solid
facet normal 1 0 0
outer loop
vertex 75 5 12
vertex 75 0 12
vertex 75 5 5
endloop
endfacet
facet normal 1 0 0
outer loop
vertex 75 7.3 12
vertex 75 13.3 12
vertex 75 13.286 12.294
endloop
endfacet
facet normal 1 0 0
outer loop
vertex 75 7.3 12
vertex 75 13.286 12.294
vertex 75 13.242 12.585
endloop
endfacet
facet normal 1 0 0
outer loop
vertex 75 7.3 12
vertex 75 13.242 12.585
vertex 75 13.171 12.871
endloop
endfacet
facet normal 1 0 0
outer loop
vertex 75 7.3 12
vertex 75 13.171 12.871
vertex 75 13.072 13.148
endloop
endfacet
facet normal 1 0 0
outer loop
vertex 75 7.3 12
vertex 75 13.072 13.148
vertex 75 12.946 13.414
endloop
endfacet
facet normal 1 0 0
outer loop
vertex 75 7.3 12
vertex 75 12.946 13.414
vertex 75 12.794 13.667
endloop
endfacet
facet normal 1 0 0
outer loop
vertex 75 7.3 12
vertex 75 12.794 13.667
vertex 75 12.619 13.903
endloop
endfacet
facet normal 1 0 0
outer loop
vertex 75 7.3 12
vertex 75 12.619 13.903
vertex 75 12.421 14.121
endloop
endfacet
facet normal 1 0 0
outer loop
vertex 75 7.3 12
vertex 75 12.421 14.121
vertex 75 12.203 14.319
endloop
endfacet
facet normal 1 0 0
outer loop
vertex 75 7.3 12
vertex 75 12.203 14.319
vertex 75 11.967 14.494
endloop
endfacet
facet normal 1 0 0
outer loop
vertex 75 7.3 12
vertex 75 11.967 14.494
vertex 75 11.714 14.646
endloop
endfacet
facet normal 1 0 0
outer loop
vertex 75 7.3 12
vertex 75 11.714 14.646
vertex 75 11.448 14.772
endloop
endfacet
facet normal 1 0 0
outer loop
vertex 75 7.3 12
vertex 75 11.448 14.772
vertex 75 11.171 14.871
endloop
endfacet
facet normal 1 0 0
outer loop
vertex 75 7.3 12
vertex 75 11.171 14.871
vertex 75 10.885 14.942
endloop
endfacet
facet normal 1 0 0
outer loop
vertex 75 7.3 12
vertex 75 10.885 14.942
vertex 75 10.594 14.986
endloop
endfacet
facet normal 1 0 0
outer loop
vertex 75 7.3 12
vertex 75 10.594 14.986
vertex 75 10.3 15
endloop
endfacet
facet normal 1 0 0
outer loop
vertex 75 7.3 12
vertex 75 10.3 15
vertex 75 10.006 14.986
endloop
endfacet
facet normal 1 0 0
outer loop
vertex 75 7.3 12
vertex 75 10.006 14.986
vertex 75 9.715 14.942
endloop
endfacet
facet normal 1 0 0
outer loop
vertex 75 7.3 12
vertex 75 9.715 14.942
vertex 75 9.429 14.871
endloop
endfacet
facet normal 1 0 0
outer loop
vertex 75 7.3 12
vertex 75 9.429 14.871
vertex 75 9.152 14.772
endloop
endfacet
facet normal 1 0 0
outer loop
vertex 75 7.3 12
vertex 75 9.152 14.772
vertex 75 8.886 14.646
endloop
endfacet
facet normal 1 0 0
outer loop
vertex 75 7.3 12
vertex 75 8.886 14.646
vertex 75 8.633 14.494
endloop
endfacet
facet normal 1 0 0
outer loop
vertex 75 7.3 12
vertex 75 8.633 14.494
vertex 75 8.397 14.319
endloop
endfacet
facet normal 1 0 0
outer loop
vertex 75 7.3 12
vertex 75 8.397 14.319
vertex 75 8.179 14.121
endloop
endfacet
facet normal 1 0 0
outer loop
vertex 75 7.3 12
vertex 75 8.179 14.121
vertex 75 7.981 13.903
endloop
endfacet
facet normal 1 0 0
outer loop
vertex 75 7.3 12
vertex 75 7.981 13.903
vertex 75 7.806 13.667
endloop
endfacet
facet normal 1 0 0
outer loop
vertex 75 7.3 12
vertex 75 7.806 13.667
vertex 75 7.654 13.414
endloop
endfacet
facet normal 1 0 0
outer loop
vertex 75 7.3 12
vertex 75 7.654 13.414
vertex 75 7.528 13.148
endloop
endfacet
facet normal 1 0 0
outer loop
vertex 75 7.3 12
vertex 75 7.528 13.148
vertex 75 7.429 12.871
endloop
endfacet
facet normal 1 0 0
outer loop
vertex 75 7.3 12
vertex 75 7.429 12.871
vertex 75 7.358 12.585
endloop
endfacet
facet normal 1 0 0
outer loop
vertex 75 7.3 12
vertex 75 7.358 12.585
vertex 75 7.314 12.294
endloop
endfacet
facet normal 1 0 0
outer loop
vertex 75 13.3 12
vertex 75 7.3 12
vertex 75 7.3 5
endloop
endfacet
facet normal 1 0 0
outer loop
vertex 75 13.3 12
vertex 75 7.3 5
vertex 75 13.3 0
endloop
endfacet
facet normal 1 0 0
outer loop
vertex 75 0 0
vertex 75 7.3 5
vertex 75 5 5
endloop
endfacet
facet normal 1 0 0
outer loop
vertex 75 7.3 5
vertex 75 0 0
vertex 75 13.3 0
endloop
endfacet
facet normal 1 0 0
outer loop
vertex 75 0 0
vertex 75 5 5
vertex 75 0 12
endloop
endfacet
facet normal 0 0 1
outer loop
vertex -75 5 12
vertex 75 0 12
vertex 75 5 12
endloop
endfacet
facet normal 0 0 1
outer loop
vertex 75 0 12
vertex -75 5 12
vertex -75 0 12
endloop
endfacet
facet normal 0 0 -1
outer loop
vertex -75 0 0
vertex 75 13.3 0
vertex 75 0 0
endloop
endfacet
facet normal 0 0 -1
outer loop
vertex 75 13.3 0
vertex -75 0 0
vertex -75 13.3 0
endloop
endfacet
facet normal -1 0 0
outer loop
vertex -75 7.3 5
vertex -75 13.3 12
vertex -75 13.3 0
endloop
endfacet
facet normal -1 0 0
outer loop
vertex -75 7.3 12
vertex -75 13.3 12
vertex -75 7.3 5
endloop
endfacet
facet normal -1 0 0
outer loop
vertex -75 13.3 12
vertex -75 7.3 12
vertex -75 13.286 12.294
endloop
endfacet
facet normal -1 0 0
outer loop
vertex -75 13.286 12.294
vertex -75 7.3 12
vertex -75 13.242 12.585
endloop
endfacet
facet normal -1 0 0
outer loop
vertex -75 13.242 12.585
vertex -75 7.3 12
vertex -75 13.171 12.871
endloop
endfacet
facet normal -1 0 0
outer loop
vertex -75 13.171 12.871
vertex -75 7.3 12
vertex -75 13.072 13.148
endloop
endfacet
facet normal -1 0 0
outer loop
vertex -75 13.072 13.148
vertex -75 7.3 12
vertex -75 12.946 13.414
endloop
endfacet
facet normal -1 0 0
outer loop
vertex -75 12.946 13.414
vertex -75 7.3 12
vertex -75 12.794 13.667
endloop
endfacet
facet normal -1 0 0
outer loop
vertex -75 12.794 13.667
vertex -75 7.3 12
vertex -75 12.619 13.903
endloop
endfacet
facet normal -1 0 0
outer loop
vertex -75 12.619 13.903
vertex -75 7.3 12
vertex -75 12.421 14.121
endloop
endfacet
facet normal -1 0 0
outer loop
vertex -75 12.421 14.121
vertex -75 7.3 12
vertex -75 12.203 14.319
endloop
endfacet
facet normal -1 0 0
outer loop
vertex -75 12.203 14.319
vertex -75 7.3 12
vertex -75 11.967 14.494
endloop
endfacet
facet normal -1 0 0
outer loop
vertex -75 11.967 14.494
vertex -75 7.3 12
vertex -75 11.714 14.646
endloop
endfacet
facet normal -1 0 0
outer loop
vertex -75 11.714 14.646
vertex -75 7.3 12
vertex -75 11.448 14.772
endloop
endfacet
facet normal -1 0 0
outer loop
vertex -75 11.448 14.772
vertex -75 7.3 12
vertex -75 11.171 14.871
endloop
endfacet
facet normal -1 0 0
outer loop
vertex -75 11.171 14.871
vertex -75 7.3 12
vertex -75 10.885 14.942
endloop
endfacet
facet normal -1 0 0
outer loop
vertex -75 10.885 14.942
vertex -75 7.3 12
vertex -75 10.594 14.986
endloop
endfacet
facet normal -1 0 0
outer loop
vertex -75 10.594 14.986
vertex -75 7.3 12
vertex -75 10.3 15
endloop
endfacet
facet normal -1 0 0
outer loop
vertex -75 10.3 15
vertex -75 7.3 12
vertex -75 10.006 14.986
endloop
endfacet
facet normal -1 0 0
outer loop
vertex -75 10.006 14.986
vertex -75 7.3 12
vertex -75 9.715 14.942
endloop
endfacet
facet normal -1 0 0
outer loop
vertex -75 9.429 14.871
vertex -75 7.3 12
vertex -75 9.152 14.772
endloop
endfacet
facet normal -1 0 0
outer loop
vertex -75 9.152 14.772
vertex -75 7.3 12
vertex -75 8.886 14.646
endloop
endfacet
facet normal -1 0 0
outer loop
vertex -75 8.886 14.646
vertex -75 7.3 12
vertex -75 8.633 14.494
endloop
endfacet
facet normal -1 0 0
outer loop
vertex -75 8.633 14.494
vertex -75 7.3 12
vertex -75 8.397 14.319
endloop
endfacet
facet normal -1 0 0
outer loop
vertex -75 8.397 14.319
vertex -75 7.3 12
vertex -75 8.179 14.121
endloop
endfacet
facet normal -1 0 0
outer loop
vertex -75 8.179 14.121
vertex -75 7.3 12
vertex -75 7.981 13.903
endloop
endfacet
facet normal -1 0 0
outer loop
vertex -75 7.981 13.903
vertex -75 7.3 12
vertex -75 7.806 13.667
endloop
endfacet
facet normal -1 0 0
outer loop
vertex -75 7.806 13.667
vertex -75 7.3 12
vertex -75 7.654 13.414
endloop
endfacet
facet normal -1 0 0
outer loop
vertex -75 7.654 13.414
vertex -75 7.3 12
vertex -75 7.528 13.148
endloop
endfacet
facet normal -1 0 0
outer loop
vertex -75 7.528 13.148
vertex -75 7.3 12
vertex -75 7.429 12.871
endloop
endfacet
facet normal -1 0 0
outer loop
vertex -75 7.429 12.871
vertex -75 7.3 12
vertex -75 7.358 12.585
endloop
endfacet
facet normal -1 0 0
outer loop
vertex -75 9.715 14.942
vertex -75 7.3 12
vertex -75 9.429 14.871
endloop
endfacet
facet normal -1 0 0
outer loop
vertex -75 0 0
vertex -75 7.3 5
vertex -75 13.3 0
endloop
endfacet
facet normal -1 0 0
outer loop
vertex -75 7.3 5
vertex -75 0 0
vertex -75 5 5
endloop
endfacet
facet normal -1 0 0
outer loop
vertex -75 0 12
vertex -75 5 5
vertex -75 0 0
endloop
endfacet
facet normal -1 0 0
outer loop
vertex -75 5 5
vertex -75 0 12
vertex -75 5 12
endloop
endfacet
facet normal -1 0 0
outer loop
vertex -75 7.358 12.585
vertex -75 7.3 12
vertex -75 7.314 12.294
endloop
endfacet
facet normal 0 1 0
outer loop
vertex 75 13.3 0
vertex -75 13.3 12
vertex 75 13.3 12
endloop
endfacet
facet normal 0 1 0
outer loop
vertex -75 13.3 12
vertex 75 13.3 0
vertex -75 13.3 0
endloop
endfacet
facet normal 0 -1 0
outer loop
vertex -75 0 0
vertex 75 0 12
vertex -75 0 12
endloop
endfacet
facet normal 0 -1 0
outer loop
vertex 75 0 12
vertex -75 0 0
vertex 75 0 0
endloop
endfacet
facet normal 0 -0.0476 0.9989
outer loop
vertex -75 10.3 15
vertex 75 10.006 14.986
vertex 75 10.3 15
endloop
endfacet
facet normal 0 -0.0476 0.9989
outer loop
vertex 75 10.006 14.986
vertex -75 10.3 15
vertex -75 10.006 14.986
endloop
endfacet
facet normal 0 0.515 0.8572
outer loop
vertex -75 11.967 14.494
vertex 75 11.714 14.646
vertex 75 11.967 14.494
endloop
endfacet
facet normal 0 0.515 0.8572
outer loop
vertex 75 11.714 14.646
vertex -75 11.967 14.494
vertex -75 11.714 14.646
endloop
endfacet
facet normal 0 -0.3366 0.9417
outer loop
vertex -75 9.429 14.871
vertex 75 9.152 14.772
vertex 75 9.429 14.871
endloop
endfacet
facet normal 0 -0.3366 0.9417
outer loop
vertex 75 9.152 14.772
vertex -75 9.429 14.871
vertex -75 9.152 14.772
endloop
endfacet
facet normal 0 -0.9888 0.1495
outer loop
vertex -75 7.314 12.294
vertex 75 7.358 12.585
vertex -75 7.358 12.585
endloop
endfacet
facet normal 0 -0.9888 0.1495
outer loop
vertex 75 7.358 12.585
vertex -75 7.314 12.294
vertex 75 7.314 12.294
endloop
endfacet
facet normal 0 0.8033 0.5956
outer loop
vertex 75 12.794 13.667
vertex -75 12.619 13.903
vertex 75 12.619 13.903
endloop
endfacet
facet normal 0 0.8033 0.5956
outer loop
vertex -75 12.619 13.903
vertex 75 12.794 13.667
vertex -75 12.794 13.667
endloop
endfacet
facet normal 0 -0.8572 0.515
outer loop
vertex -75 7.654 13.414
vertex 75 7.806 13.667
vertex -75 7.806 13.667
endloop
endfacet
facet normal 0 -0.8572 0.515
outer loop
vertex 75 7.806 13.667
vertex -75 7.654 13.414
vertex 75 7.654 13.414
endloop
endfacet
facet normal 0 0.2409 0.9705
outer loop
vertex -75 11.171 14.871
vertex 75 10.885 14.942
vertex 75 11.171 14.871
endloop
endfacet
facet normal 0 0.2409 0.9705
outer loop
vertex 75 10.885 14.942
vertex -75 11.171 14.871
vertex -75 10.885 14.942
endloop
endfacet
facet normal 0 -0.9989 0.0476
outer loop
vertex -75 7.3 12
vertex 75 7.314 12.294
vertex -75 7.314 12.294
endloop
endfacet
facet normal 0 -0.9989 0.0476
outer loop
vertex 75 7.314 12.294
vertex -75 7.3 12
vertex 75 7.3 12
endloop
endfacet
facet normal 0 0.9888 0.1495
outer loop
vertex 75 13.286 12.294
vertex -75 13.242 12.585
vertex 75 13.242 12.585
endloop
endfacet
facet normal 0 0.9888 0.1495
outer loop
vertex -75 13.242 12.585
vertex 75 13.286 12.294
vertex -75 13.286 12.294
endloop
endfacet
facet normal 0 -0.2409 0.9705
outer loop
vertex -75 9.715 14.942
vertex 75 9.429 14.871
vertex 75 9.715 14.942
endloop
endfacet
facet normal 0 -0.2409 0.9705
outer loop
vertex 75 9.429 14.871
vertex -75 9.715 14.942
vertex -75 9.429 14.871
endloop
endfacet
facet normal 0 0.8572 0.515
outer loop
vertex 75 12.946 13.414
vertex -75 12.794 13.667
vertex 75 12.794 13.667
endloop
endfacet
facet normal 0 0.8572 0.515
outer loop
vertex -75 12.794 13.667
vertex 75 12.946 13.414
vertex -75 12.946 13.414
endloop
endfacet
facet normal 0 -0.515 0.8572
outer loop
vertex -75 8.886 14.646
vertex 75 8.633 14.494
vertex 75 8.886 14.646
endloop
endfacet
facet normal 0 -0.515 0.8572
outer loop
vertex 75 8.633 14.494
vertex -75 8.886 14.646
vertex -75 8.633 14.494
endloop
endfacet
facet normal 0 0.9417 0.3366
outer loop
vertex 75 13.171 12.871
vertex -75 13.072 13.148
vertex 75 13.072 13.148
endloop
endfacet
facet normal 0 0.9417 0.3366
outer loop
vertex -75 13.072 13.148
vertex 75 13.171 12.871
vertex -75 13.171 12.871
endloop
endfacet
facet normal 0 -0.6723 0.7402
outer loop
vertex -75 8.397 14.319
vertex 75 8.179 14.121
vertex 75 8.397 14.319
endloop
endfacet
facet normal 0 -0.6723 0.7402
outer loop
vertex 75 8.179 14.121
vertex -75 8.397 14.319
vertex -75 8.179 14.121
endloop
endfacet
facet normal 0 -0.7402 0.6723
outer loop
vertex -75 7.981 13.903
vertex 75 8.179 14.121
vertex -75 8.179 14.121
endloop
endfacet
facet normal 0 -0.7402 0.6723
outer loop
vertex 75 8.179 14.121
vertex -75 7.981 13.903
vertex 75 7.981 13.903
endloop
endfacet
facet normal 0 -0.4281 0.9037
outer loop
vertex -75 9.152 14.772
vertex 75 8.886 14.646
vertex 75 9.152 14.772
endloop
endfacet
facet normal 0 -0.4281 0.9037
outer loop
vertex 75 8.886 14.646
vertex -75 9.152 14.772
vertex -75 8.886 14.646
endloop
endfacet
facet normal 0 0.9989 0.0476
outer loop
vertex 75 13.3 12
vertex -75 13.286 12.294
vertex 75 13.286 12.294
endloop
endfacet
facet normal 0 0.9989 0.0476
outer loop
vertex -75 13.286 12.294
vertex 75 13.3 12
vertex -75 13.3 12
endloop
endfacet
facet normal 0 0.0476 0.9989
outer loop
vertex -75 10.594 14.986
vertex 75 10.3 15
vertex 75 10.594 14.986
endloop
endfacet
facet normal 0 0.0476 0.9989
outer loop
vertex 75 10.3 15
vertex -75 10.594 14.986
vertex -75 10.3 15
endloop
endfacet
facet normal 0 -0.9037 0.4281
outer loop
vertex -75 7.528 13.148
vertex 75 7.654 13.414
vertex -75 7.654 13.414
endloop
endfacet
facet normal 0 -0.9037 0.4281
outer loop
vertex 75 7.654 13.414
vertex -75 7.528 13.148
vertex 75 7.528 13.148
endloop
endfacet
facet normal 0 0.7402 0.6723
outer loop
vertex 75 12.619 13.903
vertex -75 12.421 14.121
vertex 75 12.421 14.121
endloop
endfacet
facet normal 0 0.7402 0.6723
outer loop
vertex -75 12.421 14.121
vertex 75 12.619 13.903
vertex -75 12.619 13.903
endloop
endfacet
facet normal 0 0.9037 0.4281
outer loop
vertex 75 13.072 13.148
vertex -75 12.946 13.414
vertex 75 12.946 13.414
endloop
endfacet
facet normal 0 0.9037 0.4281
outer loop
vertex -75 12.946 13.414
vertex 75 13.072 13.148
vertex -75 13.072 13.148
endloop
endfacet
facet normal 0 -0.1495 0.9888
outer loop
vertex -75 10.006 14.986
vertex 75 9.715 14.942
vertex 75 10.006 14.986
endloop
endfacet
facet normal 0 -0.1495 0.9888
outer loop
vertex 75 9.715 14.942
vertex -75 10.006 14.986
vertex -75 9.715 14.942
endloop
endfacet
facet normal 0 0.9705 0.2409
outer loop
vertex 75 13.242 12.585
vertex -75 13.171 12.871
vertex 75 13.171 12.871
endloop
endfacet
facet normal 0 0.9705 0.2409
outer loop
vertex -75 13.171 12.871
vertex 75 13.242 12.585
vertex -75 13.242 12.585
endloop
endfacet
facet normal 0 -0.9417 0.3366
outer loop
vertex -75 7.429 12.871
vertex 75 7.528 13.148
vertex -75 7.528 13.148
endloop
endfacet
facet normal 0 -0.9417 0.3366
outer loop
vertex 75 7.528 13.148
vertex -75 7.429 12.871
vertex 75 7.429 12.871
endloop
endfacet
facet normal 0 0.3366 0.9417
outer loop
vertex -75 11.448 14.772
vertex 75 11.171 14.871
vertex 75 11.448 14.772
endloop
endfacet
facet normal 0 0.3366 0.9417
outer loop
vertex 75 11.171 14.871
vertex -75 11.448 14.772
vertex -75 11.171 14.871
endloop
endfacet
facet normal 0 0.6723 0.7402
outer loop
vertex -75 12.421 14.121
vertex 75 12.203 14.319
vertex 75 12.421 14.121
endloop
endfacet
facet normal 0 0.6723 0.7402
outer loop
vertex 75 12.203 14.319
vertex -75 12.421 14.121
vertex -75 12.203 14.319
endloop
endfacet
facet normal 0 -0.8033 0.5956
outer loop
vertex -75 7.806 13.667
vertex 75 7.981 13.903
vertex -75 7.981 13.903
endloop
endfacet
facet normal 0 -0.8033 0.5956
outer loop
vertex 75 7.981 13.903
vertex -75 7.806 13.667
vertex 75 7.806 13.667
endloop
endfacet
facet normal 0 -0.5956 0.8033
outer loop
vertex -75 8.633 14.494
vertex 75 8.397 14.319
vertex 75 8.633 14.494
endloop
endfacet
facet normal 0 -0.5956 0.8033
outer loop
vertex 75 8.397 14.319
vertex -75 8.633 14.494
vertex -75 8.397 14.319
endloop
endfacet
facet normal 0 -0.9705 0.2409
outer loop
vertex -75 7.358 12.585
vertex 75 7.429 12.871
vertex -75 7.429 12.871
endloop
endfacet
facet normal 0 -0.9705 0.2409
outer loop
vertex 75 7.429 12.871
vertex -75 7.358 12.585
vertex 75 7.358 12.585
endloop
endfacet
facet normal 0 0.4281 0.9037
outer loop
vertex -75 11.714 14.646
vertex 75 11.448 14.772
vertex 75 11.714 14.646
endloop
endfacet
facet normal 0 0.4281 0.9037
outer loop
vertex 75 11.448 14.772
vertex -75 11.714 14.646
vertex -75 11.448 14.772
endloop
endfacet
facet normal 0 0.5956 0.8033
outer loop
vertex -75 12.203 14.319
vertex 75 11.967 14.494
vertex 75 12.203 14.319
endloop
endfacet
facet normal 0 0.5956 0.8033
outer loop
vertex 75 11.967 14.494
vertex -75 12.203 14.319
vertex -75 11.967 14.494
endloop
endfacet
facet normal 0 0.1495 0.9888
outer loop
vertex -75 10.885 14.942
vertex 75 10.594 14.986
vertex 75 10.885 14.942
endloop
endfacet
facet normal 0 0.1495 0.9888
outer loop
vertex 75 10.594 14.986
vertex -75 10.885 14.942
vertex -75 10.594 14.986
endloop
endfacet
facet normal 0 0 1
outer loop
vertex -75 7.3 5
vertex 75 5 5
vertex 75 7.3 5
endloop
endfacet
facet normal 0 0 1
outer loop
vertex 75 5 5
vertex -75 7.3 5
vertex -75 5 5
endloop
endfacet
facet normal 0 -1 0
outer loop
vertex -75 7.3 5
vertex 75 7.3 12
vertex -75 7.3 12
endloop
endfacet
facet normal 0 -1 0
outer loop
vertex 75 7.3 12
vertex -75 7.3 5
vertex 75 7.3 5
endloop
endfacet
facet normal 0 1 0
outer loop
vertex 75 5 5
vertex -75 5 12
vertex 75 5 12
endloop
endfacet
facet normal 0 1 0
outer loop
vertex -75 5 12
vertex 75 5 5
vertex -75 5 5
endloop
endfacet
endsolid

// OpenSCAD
// file: crimp_terminal.scad
include <parameters.scad>
use <colors.scad>

module crimp_terminal_awg2_0() {
  module base_shape() {
    difference() {
      intersection() {
        translate([0, -15 + 8 / 2 + 5.5, 0])
          cylinder(d=30, h=2.5);
        cube([21.1, 100, 100], center=true);
      }
      cylinder(d=8.2, h=100, center=true);
    }
    translate([0, -15 + 8 / 2 + 5.5 - 15, 7.5])
      rotate([90, 0, 0])
        cylinder(d=15, h=53 - 30);
  }

  module modifier() {
    translate([0, -15 + 8 / 2 + 5.5 - 15, 0])
      cube([100, 5, 100], center=true);
  }

  copper() union() {
      hull() {
        intersection() {
          base_shape();
          modifier();
        }
      }
      difference() {
        base_shape();
        modifier();
      }
    }
}

crimp_terminal_awg2_0();
// file: colors.scad
module copper() {
  color("#b87333") children();
}

module nickel() {
  color("#9a9590") children();
}

module pcb() {
  color("#008c32") children();
}

module clear_acrylic() {
  color("#ffffff10") children();
}
// file: terminal_busbar.scad
include <parameters.scad>;
use <colors.scad>;
use <crimp_terminal.scad>;

show_ring_terminal = false;
show_second_plate = false;

module terminal_busbar() {
  copper()for (z = show_second_plate ? [0, busbar_thickness + copper_plate_thickness] : [0]) {
    translate([0, 0, z])
      linear_extrude(height=busbar_thickness) {
        // DXF generated with KiCad
        import("terminal_busbar.dxf");
      }
  }
  if (show_ring_terminal) {
    translate([-38, 16, 2 * busbar_thickness + copper_plate_thickness])
      rotate([0, 0, 90])
        crimp_terminal_awg2_0();
  }
}

terminal_busbar();
// file: parameters.scad
$fn = 64;

shrink_factor = 0.994; // I forgot to calibrate my ASA printer, so I'm using this factor to shrink the model after the fact

h = 70.3; // cell max height
d = 21.5 * shrink_factor; // cell max diameter

available_y = 19.5 * 25.4;

aluminum_thickness = 0.04 * 25.4; // 5052 H32 Aluminum for the case
case_dim_x = 137; // external dimensions, must be 137 to match the EIG battery box
case_dim_y = 228; // 235 is the max, can be smaller
case_dim_z = 355; // 

external_walls = 3; // acrylic

base_plate_dim_x = case_dim_x - 2 * external_walls;
base_plate_dim_y = case_dim_y - 2 * external_walls;

cell_isolation = 1 * shrink_factor; // minimum separation between cells not in parallel

plate_disk_dia = 14;
copper_width = 10;
copper_length = 9.8 * d;

nickel_width = 8;
nickel_length = 5.8 * d; // length of the nickel strip to connect 6 cells

plate_slot_length = 8;
plate_slot_width = 0.7;
copper_plate_thickness = 0.15;
nickel_plate_thickness = 0.15;
strips_pocket_height = 1;

plates_thickness = copper_plate_thickness + nickel_plate_thickness;

bulkhead_thickness = 20;

strips_clearance = 0.5;
holder_pocket_height = 5;
holder_walls = 0.5;

exploded = $t * 50;

inlet_stack_height = 20;
outlet_walls = 3;

m3_insert_od = 4.6; // 5mm OD minus some plastic to melt
m3_insert_length = 4 + 4; // 4 mm more than the insert length

m4_insert_od = 5.25; // this is the diameter of the hole, it must be smaller than the insert’s maximum OD
m4_insert_length = 8; // 2 mm more than the insert length

cell_holder_stack_height = 0.3;

strips_insulator_stack_height = 1.2;

module_60_height = h + cell_holder_stack_height * 2 + strips_insulator_stack_height * 2 + 7 * exploded;

large_spacer_stack_height = 7;

module_120_height = module_60_height * 2 + large_spacer_stack_height + exploded;

module_240_height = module_120_height * 2 + large_spacer_stack_height * 3 + exploded;

inlet_walls = 3;

ring_terminal_cutout_depth = 3;
busbar_cutout_depth = 3;
busbar_thickness = 1;
// main file
include <parameters.scad>;
use <terminal_busbar.scad>;

w = 5;
r = 3;

*translate([0, 0, 3.5 + w])
  rotate([90, 0, 0])
    terminal_busbar();

translate([-75, 0, 0])
  difference() {
    union() {

      cube([150, w + 2.3 + r * 2, 12]);
      translate([0, r + w + 2.3, 12])
        rotate([0, 90, 0])
          cylinder(h=150, r=r);
    }
    translate([-500, w, w])
      cube([1000, 2.3, 100]);
  }
